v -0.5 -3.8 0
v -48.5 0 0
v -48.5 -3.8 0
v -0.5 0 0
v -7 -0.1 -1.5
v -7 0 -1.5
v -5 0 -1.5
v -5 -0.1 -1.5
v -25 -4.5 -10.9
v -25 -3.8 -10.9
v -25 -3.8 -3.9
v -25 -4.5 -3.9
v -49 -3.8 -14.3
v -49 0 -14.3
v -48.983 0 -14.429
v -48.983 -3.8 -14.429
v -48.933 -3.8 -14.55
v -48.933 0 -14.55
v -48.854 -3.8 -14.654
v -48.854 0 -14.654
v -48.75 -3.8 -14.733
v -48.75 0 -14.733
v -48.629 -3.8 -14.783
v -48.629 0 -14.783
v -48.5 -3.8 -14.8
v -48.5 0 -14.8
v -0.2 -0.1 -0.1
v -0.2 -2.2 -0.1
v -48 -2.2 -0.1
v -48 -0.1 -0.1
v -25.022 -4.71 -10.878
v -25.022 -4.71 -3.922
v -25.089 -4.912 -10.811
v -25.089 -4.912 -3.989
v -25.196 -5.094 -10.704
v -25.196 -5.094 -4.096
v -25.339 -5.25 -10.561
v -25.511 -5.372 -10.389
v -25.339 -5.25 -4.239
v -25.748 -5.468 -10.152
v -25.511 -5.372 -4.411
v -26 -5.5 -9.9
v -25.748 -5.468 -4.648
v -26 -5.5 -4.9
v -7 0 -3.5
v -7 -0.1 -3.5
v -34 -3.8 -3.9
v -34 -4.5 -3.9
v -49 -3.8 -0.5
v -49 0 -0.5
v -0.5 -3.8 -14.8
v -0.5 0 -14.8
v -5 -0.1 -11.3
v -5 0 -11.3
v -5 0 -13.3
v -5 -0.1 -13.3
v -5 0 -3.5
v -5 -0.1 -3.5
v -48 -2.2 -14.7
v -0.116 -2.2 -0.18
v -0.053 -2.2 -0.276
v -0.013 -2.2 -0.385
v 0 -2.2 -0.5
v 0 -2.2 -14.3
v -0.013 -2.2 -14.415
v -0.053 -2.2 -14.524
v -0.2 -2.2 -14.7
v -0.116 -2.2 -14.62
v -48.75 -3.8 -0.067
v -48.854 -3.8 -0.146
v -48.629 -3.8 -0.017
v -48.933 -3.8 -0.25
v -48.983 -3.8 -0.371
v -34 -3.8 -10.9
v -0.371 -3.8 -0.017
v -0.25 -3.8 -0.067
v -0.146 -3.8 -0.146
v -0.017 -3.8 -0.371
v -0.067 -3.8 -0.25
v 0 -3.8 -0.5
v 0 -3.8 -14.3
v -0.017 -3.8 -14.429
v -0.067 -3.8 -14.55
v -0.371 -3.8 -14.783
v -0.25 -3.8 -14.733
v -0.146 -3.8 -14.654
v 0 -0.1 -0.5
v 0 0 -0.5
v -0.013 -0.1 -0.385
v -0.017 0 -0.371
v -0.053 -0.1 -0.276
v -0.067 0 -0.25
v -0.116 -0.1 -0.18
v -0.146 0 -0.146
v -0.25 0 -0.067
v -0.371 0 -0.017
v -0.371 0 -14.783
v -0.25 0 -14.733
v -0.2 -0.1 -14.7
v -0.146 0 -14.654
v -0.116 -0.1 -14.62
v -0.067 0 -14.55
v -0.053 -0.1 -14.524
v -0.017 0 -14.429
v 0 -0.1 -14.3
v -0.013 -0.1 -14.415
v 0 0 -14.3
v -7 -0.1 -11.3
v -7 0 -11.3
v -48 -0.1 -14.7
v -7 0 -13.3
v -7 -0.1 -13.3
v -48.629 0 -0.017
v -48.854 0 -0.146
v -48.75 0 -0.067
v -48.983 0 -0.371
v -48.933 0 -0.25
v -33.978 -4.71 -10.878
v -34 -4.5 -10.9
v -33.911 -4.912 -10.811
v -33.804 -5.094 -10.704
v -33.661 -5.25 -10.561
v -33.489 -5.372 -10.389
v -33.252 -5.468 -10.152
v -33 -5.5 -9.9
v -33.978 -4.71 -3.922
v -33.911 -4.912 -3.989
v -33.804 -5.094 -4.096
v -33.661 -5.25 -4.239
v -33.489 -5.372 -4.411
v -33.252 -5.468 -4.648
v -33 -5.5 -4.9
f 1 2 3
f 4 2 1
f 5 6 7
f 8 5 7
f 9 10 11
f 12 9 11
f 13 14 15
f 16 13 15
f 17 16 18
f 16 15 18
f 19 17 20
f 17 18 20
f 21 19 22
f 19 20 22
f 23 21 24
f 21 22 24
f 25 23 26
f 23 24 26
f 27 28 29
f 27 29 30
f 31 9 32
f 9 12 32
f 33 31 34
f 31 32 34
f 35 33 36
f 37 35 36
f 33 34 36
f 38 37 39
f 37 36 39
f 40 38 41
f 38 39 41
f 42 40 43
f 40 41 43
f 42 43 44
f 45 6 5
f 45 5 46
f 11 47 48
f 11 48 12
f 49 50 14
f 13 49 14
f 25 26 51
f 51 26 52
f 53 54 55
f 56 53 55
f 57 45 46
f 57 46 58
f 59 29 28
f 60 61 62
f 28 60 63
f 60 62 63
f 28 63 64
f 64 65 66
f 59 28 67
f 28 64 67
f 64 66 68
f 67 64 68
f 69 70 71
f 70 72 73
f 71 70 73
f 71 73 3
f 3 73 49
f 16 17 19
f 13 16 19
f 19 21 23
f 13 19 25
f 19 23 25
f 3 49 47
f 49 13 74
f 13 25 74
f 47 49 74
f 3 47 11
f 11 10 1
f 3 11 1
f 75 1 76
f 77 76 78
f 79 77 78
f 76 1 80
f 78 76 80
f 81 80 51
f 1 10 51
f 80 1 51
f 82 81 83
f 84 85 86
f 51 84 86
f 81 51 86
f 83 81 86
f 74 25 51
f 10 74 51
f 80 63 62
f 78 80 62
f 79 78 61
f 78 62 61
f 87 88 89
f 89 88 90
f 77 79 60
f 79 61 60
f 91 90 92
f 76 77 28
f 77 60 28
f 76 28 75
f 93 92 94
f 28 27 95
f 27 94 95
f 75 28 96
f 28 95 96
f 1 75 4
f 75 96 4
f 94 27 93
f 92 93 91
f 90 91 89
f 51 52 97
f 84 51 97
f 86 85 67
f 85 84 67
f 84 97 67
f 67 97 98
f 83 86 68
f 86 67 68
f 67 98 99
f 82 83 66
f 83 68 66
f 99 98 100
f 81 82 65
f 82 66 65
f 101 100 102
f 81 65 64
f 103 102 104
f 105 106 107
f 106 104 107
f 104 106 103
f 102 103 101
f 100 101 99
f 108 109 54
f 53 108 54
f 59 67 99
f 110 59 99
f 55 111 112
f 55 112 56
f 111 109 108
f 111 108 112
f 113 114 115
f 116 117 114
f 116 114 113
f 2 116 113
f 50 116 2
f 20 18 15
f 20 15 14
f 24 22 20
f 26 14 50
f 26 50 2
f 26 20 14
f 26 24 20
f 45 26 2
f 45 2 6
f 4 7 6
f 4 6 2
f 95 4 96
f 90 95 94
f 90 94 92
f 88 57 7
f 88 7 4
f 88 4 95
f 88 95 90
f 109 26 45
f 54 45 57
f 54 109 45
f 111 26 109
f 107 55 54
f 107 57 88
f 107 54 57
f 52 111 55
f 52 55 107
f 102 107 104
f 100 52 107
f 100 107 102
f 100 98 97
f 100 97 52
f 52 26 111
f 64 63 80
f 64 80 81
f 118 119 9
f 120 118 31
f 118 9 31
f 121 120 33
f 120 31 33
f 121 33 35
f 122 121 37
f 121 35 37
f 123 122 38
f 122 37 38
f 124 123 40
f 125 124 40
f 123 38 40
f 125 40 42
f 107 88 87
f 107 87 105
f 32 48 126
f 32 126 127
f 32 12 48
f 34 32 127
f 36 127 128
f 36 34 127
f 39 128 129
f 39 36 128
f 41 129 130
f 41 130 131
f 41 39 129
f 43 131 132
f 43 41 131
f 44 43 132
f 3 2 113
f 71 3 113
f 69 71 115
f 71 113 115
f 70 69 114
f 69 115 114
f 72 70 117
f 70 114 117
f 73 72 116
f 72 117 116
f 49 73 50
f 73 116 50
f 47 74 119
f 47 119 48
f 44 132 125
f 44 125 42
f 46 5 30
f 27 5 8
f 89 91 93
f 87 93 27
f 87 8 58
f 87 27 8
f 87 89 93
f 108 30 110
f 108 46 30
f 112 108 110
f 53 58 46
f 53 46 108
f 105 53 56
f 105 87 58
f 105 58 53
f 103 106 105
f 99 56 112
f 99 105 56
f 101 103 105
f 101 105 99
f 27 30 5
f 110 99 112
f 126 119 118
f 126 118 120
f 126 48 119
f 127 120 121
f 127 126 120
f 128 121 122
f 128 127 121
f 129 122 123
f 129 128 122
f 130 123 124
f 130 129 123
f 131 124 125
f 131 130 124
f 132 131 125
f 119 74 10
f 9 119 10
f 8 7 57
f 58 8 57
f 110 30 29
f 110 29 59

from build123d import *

# Parameters (mm, degrees)
SKETCH1_W           = 49
SKETCH1_H           = 14.8
BOSS_EXTRUDE1_DEPTH = 3.8
SKETCH2_W           = 14.6
SKETCH2_H           = 3.6
CUT_EXTRUDE1_DEPTH  = 48
SKETCH3_W           = 14.6
SKETCH3_H           = 1.5
BOSS_EXTRUDE2_DEPTH = 48
SKETCH5_W           = 2
SKETCH5_H           = 2
CUT_EXTRUDE2_DEPTH  = 2.2
FILLET1_R           = 0.5
SKETCH6_W           = 9
SKETCH6_H           = 7
BOSS_EXTRUDE3_DEPTH = 1.7
FILLET2_R           = 1


with BuildPart() as part:
    # Sketch1 → Boss-Extrude1 (new body)
    with BuildSketch(Plane(origin=(0, 0, 0), x_dir=(1, 0, 0), z_dir=(0, 1, 0))):
        with Locations((-24.5, 7.4)):
            Rectangle(SKETCH1_W, SKETCH1_H)
    extrude(amount=-BOSS_EXTRUDE1_DEPTH)

    # Sketch2 → Cut-Extrude1 (cut)
    with BuildSketch(Plane(origin=(0, 0, 0), x_dir=(0, 0, -1), z_dir=(1, 0, 0))):
        with Locations((7.4, -1.9)):
            Rectangle(SKETCH2_W, SKETCH2_H)
    extrude(amount=-CUT_EXTRUDE1_DEPTH, mode=Mode.SUBTRACT)

    # Sketch3 → Boss-Extrude2 (add)
    with BuildSketch(Plane(origin=(0, 0, 0), x_dir=(0, 0, -1), z_dir=(1, 0, 0))):
        with Locations((7.4, -2.95)):
            Rectangle(SKETCH3_W, SKETCH3_H)
    extrude(amount=-BOSS_EXTRUDE2_DEPTH)

    # Sketch5 → Cut-Extrude2 (cut)
    with BuildSketch(Plane(origin=(0, 0, 0), x_dir=(1, 0, 0), z_dir=(0, 1, 0))):
        with Locations((-6, 12.3)):
            Rectangle(SKETCH5_W, SKETCH5_H)
        with Locations((-6, 2.5)):
            Rectangle(SKETCH5_W, SKETCH5_H)
    extrude(amount=-CUT_EXTRUDE2_DEPTH, mode=Mode.SUBTRACT)

    # Fillet1
    # the kernel refuses this fillet: 0.5 mm, written as the material it takes off along each edge
    with BuildSketch(Plane(origin=(0, 1.25, 0), x_dir=(-1, 0, 0), z_dir=(0, -1, 0)), Plane(origin=(0, 1.25, -14.8), x_dir=(0, 0, 1), z_dir=(0, -1, 0))) as fillet1_piece_1:
        with BuildLine():
            CenterArc((FILLET1_R, FILLET1_R), FILLET1_R, 180, 90)
            Line((0, FILLET1_R), (0, 0))
            Line((0, 0), (FILLET1_R, 0))
        make_face()
    extrude(amount=6.3, mode=Mode.SUBTRACT)
    with BuildSketch(Plane(origin=(-49, 1.25, -14.8), x_dir=(0, 0, 1), z_dir=(0, -1, 0)), Plane(origin=(-49, 1.25, 0), x_dir=(1, 0, 0), z_dir=(0, -1, 0))) as fillet1_piece_2:
        with BuildLine():
            CenterArc((FILLET1_R, -FILLET1_R), FILLET1_R, 90, 90)
            Line((0, -FILLET1_R), (0, 0))
            Line((0, 0), (FILLET1_R, 0))
        make_face()
    extrude(amount=6.3, mode=Mode.SUBTRACT)

    # Sketch6 → Boss-Extrude3 (add)
    with BuildSketch(Plane.XZ.offset(3.8)):
        with Locations((-29.5, -7.4)):
            Rectangle(SKETCH6_W, SKETCH6_H)
    extrude(amount=BOSS_EXTRUDE3_DEPTH)

    # Fillet2
    fillet2_edges = [part.edges().sort_by_distance(p)[0] for p in [
        (-34, -5.5, -7.4),
        (-29.5, -5.5, -10.9),
        (-25, -5.5, -7.4),
        (-29.5, -5.5, -3.9),
    ]]
    fillet(fillet2_edges, radius=FILLET2_R)


solid = part.part
